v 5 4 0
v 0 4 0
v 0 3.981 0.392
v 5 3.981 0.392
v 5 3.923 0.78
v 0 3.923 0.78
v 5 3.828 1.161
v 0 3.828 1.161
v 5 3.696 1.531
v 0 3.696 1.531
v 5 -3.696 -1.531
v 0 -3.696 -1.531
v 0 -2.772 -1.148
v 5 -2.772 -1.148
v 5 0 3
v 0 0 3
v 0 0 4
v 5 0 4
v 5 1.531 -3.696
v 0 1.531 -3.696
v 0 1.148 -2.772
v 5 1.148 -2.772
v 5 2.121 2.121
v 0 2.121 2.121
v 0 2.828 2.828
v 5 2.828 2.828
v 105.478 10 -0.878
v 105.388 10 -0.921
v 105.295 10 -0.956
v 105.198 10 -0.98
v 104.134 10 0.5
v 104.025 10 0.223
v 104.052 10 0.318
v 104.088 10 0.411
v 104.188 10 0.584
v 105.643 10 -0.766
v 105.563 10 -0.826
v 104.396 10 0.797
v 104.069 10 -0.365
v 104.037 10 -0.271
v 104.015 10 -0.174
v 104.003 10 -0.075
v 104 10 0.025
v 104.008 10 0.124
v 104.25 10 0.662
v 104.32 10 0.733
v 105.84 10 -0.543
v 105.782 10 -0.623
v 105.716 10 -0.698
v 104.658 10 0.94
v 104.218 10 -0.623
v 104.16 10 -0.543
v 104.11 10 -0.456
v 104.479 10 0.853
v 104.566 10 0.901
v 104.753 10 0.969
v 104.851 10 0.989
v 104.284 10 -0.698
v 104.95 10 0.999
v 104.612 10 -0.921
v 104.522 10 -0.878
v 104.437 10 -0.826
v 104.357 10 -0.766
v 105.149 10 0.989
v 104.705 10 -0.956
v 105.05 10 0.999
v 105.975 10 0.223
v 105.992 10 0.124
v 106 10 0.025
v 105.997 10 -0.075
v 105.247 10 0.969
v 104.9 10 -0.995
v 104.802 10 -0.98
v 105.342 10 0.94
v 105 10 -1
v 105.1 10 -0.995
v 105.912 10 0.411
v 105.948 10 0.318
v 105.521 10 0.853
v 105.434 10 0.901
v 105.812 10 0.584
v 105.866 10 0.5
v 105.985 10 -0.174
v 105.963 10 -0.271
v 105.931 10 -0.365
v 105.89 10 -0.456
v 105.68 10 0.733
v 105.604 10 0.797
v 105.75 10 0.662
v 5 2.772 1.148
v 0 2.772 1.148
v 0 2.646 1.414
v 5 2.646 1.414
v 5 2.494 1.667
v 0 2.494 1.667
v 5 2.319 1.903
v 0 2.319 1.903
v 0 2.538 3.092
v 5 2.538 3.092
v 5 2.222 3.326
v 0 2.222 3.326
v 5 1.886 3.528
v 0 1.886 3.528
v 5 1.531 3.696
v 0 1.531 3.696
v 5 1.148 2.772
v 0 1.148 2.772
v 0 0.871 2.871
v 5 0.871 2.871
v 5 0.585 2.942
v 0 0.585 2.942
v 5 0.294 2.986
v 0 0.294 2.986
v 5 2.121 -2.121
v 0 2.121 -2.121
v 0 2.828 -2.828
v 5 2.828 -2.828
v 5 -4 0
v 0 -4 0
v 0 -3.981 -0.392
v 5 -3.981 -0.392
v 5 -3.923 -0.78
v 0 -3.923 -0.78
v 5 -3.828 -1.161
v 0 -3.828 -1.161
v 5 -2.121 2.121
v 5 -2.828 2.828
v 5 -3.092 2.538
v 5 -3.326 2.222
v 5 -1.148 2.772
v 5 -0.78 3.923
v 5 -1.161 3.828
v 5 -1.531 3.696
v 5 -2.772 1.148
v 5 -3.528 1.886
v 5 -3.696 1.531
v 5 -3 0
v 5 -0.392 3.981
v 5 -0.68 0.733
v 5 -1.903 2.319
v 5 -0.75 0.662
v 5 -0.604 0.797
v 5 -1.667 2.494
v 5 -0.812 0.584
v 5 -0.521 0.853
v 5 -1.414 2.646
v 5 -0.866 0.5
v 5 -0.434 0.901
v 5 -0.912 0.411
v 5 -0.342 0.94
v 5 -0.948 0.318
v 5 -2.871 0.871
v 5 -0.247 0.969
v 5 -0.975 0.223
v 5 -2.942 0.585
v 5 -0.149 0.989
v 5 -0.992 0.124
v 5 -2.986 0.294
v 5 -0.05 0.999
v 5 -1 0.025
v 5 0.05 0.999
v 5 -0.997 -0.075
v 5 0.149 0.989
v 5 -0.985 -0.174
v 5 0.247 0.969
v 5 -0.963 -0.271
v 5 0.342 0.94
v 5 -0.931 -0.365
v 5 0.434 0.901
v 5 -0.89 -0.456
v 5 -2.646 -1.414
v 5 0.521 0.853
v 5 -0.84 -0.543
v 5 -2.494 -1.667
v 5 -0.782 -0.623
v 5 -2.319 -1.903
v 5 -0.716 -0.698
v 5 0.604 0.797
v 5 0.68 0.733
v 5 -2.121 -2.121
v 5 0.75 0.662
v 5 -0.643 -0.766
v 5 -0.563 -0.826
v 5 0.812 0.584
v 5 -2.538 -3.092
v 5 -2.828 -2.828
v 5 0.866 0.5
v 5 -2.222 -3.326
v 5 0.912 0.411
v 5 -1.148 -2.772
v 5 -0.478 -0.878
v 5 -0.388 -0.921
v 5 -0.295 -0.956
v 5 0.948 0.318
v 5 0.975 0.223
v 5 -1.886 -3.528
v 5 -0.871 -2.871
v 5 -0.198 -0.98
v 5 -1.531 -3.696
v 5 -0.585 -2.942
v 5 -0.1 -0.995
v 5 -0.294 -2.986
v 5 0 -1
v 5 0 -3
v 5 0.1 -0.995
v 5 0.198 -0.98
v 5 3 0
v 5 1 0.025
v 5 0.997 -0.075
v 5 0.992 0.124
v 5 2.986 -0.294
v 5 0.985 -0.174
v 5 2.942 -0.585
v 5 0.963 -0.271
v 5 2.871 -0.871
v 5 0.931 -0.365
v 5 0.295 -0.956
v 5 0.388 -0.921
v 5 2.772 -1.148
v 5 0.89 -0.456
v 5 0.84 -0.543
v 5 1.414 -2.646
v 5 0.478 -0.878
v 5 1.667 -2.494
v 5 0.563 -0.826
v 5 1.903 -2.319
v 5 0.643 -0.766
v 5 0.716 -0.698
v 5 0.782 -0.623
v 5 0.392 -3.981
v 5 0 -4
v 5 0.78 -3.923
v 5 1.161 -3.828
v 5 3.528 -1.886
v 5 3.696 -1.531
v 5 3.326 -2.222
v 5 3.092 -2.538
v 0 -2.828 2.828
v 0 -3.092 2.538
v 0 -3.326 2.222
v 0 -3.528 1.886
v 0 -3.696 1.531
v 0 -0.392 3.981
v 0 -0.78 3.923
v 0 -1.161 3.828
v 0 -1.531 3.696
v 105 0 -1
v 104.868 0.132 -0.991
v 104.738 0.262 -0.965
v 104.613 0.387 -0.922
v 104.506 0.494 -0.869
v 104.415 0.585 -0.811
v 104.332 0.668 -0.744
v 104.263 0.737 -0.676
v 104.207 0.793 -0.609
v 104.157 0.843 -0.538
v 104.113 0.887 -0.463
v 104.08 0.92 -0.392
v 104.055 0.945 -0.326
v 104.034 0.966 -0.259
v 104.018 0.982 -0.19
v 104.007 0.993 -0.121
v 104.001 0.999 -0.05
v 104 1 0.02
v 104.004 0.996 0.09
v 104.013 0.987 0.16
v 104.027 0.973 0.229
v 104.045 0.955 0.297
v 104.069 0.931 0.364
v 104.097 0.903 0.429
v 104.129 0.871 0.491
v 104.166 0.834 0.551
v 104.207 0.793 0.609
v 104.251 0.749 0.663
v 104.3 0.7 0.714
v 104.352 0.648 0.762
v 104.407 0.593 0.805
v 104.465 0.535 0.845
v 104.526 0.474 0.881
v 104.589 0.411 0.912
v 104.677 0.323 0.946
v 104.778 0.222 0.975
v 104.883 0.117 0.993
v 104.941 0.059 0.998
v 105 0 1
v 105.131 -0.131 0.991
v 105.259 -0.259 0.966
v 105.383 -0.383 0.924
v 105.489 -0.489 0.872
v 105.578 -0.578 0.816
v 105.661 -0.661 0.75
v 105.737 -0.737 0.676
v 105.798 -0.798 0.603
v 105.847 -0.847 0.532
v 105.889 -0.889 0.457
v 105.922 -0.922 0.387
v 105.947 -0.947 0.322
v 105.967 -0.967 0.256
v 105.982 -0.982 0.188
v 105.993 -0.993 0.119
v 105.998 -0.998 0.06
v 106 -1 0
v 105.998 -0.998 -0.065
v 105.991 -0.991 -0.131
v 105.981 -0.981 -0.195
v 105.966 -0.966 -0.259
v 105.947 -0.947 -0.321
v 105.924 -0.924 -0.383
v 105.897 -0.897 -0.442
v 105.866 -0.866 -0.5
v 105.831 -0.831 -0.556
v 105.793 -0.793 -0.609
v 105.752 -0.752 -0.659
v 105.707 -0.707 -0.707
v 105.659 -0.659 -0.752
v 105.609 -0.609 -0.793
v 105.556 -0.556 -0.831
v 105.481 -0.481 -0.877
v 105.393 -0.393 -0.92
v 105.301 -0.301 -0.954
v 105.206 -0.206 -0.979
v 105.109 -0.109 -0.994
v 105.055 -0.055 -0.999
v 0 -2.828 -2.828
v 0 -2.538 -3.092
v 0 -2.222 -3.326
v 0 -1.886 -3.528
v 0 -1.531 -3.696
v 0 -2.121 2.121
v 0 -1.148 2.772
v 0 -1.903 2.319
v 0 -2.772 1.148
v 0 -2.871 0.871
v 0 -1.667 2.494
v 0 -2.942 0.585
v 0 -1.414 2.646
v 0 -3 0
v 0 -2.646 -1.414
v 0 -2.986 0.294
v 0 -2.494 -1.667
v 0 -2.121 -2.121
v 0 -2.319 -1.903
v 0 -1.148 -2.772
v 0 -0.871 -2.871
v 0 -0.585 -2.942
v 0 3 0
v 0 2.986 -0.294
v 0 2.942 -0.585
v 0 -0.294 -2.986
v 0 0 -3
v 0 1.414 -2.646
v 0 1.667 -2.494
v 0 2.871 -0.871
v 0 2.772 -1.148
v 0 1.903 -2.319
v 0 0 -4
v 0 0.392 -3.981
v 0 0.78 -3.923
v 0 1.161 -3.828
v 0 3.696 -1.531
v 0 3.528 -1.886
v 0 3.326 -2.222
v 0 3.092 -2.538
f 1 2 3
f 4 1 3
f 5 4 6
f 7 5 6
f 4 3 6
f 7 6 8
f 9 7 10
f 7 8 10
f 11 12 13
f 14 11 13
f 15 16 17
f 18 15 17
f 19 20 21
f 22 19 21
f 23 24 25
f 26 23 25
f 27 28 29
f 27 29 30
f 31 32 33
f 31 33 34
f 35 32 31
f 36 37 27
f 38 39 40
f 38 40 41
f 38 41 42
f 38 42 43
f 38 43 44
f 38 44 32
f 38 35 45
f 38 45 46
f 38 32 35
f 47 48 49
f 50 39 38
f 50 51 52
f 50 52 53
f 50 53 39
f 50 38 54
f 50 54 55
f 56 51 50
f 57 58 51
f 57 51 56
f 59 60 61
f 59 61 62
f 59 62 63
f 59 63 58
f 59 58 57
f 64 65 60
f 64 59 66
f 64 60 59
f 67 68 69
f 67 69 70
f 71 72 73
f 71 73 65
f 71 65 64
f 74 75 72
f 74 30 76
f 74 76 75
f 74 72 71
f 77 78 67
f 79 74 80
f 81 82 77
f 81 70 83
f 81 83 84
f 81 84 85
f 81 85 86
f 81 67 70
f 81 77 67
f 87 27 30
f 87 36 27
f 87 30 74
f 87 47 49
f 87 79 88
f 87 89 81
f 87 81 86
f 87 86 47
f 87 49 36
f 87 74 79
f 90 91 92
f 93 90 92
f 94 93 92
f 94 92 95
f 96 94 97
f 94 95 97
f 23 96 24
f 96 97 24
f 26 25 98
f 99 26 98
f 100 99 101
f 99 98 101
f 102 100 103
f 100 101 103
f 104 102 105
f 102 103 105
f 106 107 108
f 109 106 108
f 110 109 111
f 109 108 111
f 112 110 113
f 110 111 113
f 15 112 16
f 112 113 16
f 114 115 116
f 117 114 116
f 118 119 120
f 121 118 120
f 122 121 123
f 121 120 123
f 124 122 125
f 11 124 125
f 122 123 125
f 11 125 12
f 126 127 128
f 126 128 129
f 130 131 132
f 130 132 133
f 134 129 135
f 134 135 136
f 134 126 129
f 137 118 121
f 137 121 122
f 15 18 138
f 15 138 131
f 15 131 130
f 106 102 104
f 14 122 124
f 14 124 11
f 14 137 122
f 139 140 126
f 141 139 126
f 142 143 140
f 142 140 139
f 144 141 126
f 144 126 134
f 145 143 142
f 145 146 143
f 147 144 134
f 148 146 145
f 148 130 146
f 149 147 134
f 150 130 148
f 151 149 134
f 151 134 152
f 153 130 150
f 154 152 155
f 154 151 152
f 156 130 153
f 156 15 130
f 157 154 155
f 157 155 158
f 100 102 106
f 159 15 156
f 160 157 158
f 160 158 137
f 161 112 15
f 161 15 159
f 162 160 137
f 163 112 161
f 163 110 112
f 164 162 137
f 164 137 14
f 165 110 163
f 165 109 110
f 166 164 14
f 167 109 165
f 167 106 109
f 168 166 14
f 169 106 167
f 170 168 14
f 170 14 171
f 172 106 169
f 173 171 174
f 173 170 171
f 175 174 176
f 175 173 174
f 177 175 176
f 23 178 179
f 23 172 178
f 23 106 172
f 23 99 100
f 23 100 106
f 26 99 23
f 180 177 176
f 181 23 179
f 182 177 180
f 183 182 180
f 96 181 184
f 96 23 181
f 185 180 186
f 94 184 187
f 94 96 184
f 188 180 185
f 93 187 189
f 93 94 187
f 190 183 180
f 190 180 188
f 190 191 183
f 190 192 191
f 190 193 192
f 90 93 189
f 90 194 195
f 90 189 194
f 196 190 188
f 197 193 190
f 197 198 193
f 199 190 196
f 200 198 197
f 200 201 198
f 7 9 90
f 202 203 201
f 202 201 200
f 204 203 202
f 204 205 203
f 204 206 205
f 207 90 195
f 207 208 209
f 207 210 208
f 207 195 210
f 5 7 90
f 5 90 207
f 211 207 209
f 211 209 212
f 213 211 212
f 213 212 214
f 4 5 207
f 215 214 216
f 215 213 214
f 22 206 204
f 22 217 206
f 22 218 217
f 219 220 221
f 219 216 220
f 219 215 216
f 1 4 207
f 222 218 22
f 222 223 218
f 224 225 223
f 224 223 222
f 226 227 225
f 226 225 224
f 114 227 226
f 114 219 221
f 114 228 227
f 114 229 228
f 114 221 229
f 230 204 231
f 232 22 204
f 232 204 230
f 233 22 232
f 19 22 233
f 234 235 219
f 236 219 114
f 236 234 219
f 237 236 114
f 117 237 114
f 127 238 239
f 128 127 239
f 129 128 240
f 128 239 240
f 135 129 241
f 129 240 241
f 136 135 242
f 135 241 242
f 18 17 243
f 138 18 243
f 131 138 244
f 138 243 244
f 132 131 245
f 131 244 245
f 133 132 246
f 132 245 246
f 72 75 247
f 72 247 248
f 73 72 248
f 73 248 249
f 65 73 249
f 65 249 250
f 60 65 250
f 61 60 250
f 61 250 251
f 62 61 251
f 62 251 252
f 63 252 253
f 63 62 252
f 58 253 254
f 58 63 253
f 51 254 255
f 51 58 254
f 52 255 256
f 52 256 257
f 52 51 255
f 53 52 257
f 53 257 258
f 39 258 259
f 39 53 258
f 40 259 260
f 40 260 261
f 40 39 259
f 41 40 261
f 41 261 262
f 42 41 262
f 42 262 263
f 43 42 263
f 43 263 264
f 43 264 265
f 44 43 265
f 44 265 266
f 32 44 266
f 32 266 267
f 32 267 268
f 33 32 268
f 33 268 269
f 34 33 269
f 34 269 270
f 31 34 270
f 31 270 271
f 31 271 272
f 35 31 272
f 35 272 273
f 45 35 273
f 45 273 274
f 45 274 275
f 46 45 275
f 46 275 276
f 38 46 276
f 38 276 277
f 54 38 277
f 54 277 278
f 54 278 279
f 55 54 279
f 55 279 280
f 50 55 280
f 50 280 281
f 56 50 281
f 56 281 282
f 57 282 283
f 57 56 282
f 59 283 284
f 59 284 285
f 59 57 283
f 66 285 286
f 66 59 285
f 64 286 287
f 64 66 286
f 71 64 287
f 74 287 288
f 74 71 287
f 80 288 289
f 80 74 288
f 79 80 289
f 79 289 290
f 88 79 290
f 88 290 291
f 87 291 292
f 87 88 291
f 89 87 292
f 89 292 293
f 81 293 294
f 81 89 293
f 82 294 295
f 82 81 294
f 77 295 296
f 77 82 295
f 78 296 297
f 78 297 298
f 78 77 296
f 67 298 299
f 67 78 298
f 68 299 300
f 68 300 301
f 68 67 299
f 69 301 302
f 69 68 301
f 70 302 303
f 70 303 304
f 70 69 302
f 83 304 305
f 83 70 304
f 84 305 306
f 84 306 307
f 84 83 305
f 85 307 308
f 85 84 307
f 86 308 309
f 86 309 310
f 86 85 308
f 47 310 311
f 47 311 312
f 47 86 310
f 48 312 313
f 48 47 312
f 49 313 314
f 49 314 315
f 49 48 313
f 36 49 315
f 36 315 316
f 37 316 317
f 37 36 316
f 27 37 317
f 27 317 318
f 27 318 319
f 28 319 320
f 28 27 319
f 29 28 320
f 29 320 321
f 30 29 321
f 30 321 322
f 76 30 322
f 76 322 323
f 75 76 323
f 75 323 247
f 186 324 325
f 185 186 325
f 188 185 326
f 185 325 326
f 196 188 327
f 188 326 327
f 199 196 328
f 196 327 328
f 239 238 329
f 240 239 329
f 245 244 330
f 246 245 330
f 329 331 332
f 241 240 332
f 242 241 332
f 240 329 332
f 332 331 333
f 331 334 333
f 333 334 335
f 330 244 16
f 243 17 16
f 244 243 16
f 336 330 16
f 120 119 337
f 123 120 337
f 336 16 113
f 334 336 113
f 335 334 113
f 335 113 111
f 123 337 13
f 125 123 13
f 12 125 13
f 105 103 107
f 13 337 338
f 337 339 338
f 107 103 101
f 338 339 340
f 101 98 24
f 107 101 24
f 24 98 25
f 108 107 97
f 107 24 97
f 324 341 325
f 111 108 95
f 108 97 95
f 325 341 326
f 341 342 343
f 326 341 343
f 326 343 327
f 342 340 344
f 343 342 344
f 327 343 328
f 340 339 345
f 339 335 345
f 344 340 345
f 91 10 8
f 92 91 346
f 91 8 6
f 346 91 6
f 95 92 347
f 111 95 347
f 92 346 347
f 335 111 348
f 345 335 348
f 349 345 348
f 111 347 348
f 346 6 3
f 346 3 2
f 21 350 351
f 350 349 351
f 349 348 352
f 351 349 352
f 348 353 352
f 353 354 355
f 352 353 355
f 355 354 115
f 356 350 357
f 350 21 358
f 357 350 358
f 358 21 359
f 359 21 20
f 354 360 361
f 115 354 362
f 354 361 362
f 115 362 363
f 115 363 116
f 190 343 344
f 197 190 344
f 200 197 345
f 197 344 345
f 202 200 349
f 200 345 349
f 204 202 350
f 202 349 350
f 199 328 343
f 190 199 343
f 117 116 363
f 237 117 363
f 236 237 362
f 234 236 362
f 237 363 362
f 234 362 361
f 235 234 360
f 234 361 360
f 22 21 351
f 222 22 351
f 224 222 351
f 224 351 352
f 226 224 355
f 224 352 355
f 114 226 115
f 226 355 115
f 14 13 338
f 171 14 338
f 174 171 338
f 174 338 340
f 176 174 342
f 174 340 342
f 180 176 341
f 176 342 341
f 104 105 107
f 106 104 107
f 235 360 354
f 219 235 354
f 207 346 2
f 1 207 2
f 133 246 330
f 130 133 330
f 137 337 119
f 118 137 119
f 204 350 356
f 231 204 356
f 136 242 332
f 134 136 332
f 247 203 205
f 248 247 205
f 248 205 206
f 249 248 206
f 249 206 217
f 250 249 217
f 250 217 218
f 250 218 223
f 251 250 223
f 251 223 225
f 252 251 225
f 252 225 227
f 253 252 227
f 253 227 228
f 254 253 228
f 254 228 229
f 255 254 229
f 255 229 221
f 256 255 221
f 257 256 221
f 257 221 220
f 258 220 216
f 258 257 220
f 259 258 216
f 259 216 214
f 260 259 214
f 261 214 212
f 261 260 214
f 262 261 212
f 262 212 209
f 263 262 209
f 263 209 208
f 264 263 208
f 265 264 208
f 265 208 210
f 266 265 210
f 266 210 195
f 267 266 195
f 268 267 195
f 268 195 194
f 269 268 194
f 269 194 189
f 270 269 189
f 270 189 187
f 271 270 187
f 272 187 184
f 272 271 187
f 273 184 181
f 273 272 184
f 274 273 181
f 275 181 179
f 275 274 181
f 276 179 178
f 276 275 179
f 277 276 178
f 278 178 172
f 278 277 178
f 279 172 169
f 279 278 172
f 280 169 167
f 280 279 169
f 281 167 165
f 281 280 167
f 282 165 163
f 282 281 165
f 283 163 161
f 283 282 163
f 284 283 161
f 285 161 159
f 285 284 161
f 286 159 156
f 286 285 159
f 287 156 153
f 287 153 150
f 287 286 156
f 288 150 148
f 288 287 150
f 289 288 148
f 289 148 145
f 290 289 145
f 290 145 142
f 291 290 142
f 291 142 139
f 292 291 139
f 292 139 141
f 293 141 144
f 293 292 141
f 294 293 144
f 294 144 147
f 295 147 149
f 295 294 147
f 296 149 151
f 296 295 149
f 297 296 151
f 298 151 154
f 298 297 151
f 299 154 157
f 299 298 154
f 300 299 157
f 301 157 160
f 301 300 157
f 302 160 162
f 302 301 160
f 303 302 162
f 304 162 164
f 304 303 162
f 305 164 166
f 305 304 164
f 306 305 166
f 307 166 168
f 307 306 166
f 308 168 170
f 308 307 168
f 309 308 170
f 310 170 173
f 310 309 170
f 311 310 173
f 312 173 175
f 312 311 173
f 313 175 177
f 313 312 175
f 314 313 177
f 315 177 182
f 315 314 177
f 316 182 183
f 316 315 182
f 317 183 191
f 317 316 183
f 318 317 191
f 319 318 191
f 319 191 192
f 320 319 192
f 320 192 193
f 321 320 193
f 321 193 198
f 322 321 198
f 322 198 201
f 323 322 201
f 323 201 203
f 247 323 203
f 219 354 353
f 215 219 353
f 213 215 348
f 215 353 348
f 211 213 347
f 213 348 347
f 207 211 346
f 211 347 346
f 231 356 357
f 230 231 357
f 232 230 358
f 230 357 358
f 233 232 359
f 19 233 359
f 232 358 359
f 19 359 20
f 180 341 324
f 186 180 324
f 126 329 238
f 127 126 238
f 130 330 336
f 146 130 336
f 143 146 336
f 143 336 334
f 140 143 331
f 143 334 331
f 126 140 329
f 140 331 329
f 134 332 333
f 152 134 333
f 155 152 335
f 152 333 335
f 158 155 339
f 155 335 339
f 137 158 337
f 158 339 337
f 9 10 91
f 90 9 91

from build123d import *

# Parameters (mm, degrees)
IZIM1_R                     = 4
Y_KSEKLIK_EKSTR_ZYON1_DEPTH = 5
KES_EKSTR_ZYON1_DEPTH       = 5
IZIM3_R                     = 1


with BuildPart() as part:
    # Çizim1 → Yükseklik-Ekstrüzyon1 (new body)
    with BuildSketch(Plane(origin=(0, 0, 0), x_dir=(0, 0, -1), z_dir=(1, 0, 0))):
        Circle(IZIM1_R)
    extrude(amount=Y_KSEKLIK_EKSTR_ZYON1_DEPTH)

    # Çizim2 → Kes-Ekstrüzyon1 (cut)
    with BuildSketch(Plane(origin=(0, 0, 0), x_dir=(0, 0, -1), z_dir=(1, 0, 0))):
        with BuildLine():
            Line((0, 3), (0, 4))
            ThreePointArc((0, 4), (0.780361288, 3.923141122), (1.530733729, 3.69551813))
            Line((1.530733729, 3.69551813), (1.148050297, 2.771638598))
            ThreePointArc((1.148050297, 2.771638598), (0.585270966, 2.942355841), (0, 3))
        make_face()
        with BuildLine():
            Line((2.121320344, 2.121320344), (2.828427125, 2.828427125))
            ThreePointArc((2.828427125, 2.828427125), (3.325878449, 2.222280932), (3.69551813, 1.530733729))
            Line((3.69551813, 1.530733729), (2.771638598, 1.148050297))
            ThreePointArc((2.771638598, 1.148050297), (2.494408837, 1.666710699), (2.121320344, 2.121320344))
        make_face()
        with BuildLine():
            Line((3, 0), (4, 0))
            ThreePointArc((4, 0), (3.923141122, -0.780361288), (3.69551813, -1.530733729))
            Line((3.69551813, -1.530733729), (2.771638598, -1.148050297))
            ThreePointArc((2.771638598, -1.148050297), (2.942355841, -0.585270966), (3, 0))
        make_face()
        with BuildLine():
            Line((2.121320344, -2.121320344), (2.828427125, -2.828427125))
            ThreePointArc((2.828427125, -2.828427125), (2.222280932, -3.325878449), (1.530733729, -3.69551813))
            Line((1.530733729, -3.69551813), (1.148050297, -2.771638598))
            ThreePointArc((1.148050297, -2.771638598), (1.666710699, -2.494408837), (2.121320344, -2.121320344))
        make_face()
        with BuildLine():
            Line((0, -3), (0, -4))
            ThreePointArc((0, -4), (-0.780361288, -3.923141122), (-1.530733729, -3.69551813))
            Line((-1.530733729, -3.69551813), (-1.148050297, -2.771638598))
            ThreePointArc((-1.148050297, -2.771638598), (-0.585270966, -2.942355841), (0, -3))
        make_face()
        with BuildLine():
            Line((-2.121320344, -2.121320344), (-2.828427125, -2.828427125))
            ThreePointArc((-2.828427125, -2.828427125), (-3.325878449, -2.222280932), (-3.69551813, -1.530733729))
            Line((-3.69551813, -1.530733729), (-2.771638598, -1.148050297))
            ThreePointArc((-2.771638598, -1.148050297), (-2.494408837, -1.666710699), (-2.121320344, -2.121320344))
        make_face()
        with BuildLine():
            Line((-3, 0), (-4, 0))
            ThreePointArc((-4, 0), (-3.923141122, 0.780361288), (-3.69551813, 1.530733729))
            Line((-3.69551813, 1.530733729), (-2.771638598, 1.148050297))
            ThreePointArc((-2.771638598, 1.148050297), (-2.942355841, 0.585270966), (-3, 0))
        make_face()
        with BuildLine():
            Line((-2.121320344, 2.121320344), (-2.828427125, 2.828427125))
            ThreePointArc((-2.828427125, 2.828427125), (-2.222280932, 3.325878449), (-1.530733729, 3.69551813))
            Line((-1.530733729, 3.69551813), (-1.148050297, 2.771638598))
            ThreePointArc((-1.148050297, 2.771638598), (-1.666710699, 2.494408837), (-2.121320344, 2.121320344))
        make_face()
    extrude(amount=KES_EKSTR_ZYON1_DEPTH, mode=Mode.SUBTRACT)

    # Süpür1: sweep along a path in Çizim4
    with BuildLine(Plane.XY) as s_p_r1_path:
        Line((5, 0), (105, 0))
        Line((105, 0), (105, 10))
    # Çizim3 → Süpür1 (sweep)
    with BuildSketch(Plane(origin=(5, 0, 0), x_dir=(0, 0, -1), z_dir=(1, 0, 0))):
        Circle(IZIM3_R)
    sweep(path=s_p_r1_path.line, transition=Transition.RIGHT)


solid = part.part
